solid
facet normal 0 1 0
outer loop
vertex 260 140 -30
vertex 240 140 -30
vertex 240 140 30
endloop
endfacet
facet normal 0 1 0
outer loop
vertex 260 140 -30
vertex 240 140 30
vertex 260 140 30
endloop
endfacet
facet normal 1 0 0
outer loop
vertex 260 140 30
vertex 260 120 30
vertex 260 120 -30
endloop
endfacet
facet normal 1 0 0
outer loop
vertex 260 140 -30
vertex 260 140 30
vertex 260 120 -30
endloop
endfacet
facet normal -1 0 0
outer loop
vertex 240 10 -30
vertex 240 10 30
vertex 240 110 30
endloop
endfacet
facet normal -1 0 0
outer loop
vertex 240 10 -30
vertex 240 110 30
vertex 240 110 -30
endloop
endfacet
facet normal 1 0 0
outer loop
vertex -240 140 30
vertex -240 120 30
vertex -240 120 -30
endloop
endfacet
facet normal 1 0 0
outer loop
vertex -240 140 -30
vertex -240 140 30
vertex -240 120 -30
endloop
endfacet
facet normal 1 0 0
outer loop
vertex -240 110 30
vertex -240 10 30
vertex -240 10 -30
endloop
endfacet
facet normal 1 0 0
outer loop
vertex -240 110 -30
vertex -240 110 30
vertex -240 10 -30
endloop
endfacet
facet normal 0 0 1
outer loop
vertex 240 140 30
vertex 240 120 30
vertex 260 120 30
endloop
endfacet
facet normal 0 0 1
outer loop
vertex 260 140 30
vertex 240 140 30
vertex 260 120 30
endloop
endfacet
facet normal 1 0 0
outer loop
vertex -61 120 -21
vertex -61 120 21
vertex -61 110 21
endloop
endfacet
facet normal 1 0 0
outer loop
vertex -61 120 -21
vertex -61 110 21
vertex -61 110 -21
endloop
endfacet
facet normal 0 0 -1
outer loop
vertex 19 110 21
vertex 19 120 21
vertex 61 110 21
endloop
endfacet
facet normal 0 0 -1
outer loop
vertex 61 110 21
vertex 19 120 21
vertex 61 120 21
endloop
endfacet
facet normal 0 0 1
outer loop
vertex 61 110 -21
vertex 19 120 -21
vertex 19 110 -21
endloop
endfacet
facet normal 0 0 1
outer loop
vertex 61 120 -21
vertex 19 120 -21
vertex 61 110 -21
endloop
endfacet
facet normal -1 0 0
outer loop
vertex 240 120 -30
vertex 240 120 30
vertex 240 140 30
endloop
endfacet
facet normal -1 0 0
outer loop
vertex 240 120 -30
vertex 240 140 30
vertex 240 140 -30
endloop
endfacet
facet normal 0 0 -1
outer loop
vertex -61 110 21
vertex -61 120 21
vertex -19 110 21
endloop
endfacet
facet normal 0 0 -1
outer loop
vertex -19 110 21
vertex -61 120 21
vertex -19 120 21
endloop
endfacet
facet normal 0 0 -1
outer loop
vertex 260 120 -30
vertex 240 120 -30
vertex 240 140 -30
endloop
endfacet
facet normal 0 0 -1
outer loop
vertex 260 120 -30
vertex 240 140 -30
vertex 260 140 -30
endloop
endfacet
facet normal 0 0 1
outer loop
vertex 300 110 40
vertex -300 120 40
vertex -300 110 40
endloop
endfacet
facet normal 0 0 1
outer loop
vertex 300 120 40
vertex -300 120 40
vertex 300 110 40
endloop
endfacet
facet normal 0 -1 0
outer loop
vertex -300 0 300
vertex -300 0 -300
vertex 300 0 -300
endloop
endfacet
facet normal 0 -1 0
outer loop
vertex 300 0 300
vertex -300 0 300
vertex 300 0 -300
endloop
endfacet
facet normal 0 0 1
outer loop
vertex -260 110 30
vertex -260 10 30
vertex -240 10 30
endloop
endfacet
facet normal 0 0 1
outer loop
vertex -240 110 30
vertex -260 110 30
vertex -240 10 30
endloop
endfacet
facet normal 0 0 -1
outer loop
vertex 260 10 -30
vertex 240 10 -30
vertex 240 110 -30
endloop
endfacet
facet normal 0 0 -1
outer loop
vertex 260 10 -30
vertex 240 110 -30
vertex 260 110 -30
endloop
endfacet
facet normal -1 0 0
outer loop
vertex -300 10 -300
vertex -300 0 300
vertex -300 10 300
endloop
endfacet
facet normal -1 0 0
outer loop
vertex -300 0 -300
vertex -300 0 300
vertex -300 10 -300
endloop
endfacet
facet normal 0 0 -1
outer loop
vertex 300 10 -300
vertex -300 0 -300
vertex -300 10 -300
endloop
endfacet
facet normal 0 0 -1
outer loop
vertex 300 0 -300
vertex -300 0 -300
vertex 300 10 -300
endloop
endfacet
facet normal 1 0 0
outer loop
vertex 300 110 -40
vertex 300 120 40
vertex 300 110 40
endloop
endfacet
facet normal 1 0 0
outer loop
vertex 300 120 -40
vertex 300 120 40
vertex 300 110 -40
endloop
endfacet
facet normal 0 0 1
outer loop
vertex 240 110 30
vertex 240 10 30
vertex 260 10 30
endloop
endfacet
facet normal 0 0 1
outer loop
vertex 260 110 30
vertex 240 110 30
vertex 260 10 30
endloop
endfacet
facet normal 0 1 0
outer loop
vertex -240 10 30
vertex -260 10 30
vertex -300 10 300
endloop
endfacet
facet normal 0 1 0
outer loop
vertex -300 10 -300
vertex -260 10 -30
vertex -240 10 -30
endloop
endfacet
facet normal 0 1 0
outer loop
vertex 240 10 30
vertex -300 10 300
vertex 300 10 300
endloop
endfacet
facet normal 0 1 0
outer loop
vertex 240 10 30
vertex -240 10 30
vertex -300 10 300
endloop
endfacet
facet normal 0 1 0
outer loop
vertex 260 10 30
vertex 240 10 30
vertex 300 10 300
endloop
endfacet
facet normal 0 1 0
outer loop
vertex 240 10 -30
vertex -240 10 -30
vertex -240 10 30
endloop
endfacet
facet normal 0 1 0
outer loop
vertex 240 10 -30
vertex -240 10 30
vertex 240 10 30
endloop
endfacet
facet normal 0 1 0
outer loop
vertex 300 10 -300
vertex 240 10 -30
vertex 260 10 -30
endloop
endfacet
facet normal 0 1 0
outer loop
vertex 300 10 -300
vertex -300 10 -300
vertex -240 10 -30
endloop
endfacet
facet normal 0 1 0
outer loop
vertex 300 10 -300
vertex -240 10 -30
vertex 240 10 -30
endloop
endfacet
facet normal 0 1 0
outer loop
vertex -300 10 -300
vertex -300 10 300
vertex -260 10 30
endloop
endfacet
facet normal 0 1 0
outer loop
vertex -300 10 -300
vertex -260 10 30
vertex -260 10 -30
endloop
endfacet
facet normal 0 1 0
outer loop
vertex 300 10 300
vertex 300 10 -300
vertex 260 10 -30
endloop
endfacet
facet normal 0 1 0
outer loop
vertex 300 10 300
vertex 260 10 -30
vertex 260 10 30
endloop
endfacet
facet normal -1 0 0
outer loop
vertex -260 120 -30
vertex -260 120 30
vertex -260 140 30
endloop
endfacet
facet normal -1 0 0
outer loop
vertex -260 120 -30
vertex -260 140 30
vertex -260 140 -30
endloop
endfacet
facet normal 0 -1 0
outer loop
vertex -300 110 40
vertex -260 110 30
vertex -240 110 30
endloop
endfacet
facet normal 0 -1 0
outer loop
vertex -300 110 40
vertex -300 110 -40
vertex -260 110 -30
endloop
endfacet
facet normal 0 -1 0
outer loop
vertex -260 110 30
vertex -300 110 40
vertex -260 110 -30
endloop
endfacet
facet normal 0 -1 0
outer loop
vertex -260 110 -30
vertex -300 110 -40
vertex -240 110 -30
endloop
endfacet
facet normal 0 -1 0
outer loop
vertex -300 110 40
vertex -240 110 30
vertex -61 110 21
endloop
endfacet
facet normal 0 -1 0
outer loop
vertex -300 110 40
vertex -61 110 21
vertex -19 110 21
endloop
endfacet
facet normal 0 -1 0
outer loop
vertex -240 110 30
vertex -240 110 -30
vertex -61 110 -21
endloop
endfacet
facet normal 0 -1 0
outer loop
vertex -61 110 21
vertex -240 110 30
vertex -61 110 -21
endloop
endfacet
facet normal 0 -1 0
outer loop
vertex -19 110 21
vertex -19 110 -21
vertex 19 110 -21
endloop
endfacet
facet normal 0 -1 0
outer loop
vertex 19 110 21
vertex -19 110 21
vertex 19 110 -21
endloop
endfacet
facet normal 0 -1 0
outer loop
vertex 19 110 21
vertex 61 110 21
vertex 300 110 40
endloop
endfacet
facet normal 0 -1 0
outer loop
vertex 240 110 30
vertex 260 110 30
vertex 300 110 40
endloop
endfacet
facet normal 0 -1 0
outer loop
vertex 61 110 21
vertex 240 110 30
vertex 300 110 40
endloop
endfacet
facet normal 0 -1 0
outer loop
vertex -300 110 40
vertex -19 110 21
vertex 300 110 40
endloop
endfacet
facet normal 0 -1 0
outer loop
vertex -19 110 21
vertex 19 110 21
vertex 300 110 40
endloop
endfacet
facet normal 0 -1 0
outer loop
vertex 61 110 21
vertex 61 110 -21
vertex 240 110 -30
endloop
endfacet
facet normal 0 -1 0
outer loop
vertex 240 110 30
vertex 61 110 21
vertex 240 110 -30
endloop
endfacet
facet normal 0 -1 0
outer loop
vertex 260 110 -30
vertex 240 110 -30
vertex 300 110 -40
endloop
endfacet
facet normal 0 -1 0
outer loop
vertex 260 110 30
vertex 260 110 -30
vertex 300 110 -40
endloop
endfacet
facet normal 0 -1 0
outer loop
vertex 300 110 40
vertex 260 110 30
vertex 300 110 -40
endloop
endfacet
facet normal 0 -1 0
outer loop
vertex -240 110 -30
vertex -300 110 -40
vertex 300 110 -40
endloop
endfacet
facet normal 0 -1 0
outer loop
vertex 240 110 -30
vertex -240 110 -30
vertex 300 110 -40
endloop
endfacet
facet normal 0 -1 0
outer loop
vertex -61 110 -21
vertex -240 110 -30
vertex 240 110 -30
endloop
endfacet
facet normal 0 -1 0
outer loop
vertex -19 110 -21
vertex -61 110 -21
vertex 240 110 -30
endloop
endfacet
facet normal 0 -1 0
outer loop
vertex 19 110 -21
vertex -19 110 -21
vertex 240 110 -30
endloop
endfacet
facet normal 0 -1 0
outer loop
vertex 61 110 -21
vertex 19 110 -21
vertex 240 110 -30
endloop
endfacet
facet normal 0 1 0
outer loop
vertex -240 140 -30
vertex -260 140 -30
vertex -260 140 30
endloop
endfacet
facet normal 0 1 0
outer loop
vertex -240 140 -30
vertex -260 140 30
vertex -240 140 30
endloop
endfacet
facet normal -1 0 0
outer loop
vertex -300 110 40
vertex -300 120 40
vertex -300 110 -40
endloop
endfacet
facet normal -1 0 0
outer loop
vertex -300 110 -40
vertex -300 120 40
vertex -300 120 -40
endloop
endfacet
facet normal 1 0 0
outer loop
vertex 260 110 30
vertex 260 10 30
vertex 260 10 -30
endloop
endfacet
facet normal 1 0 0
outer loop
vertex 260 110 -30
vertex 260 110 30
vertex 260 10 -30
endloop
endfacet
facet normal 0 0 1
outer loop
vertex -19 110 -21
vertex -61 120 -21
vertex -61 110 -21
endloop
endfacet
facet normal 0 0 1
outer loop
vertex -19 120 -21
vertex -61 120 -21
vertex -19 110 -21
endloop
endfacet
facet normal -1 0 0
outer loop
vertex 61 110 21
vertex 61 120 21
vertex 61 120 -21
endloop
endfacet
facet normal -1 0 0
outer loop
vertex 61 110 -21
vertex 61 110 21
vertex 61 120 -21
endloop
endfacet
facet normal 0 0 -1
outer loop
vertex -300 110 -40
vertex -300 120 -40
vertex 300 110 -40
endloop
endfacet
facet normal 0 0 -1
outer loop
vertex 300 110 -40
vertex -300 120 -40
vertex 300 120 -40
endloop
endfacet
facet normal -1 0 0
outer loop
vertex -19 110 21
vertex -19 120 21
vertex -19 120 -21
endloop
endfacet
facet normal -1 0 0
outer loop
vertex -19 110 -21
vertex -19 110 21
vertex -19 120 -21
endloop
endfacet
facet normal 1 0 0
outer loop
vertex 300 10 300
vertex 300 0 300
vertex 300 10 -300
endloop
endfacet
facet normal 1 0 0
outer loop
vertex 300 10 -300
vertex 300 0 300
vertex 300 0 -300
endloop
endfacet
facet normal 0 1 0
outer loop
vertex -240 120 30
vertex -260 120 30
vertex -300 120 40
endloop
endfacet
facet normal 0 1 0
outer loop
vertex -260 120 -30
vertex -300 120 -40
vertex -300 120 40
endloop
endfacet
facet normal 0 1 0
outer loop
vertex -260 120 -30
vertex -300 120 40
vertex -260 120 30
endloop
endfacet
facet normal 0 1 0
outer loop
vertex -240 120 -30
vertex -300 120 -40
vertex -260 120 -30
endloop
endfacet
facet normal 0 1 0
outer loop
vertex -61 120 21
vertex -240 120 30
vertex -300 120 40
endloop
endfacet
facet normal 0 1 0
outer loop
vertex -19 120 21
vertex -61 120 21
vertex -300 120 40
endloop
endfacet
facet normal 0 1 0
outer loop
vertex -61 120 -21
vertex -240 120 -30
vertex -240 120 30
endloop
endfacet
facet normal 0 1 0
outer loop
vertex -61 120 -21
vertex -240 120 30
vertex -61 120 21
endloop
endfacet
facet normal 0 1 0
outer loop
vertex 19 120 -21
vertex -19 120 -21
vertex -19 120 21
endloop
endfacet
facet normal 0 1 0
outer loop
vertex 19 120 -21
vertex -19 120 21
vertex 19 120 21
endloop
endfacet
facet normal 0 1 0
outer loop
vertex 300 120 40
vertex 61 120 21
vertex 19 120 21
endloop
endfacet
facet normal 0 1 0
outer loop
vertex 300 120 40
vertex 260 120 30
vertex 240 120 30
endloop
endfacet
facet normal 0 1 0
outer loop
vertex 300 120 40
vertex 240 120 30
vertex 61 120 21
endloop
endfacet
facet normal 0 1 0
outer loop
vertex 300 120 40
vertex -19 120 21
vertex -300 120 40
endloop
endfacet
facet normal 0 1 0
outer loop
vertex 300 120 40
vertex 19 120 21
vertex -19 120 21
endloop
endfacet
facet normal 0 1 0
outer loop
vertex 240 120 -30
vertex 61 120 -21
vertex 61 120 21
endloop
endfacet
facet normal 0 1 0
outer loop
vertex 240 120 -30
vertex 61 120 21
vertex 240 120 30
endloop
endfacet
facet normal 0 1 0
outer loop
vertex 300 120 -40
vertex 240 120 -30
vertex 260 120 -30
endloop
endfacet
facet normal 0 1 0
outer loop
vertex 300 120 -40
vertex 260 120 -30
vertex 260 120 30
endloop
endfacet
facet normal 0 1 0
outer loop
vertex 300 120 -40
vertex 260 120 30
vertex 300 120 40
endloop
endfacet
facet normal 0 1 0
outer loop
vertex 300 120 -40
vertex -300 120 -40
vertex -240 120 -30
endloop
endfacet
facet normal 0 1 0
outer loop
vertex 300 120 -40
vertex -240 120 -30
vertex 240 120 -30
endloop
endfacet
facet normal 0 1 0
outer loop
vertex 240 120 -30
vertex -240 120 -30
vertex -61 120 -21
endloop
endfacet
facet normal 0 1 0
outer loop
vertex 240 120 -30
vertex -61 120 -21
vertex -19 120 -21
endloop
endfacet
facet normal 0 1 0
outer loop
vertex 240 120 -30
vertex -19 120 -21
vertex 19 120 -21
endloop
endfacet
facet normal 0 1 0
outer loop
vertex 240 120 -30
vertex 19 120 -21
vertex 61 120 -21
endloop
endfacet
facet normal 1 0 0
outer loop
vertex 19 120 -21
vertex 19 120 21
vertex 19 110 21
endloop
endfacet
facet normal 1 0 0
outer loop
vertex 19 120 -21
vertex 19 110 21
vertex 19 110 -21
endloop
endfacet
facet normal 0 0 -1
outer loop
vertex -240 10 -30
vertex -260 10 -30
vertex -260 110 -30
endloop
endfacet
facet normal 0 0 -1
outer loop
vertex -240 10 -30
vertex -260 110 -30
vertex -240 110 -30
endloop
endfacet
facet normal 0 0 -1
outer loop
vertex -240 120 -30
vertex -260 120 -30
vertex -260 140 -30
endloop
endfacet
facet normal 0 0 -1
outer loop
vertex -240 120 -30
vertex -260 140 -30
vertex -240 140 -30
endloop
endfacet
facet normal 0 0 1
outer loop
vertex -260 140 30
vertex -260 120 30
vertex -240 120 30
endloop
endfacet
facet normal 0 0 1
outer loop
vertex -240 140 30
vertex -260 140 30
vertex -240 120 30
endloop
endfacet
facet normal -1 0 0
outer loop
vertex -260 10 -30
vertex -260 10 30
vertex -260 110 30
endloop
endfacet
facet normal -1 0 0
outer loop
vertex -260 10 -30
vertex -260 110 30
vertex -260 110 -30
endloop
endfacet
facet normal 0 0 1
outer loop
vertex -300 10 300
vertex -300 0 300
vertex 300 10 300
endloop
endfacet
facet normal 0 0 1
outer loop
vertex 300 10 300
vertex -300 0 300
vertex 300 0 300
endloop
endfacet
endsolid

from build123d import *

# Parameters (mm, degrees)
SKETCH1_W           = 600
SKETCH1_H           = 600
BOSS_EXTRUDE1_DEPTH = 10
SKETCH2_W           = 20
SKETCH2_H           = 60
BOSS_EXTRUDE2_DEPTH = 130
SKETCH3_W           = 600
SKETCH3_H           = 600
SKETCH3_W_2         = 20
SKETCH3_H_2         = 60
BOSS_EXTRUDE3_DEPTH = 10
SKETCH4_OUTSIDE_W   = 774
SKETCH4_OUTSIDE_H   = 774
SKETCH4_OUTSIDE_W_2 = 600
SKETCH4_OUTSIDE_H_2 = 80
CUT_EXTRUDE1_DEPTH  = 10
SKETCH5_W           = 42
SKETCH5_H           = 42
CUT_EXTRUDE2_DEPTH  = 10


with BuildPart() as part:
    # Sketch1 → Boss-Extrude1 (new body)
    with BuildSketch(Plane(origin=(0, 0, 0), x_dir=(1, 0, 0), z_dir=(0, 1, 0))):
        Rectangle(SKETCH1_W, SKETCH1_H)
    extrude(amount=BOSS_EXTRUDE1_DEPTH)

    # Sketch2 → Boss-Extrude2 (add)
    with BuildSketch(Plane(origin=(0, 10, 0), x_dir=(1, 0, 0), z_dir=(0, 1, 0))):
        with Locations((-250, 0)):
            Rectangle(SKETCH2_W, SKETCH2_H)
        with Locations((250, 0)):
            Rectangle(SKETCH2_W, SKETCH2_H)
    extrude(amount=BOSS_EXTRUDE2_DEPTH)

    # Sketch3 → Boss-Extrude3 (add)
    with BuildSketch(Plane(origin=(0, 110, 0), x_dir=(1, 0, 0), z_dir=(0, 1, 0))):
        Rectangle(SKETCH3_W, SKETCH3_H)
        with Locations((-250, 0)):
            Rectangle(SKETCH3_W_2, SKETCH3_H_2, mode=Mode.SUBTRACT)
        with Locations((250, 0)):
            Rectangle(SKETCH3_W_2, SKETCH3_H_2, mode=Mode.SUBTRACT)
    extrude(amount=BOSS_EXTRUDE3_DEPTH)

    # Sketch4 outside → Cut-Extrude1 (cut)
    with BuildSketch(Plane(origin=(0, 120, 0), x_dir=(1, 0, 0), z_dir=(0, 1, 0))):
        Rectangle(SKETCH4_OUTSIDE_W, SKETCH4_OUTSIDE_H)
        Rectangle(SKETCH4_OUTSIDE_W_2, SKETCH4_OUTSIDE_H_2, mode=Mode.SUBTRACT)
    extrude(amount=-CUT_EXTRUDE1_DEPTH, mode=Mode.SUBTRACT)

    # Sketch5 → Cut-Extrude2 (cut)
    with BuildSketch(Plane(origin=(0, 120, 0), x_dir=(1, 0, 0), z_dir=(0, 1, 0))):
        with Locations((-40, 0)):
            Rectangle(SKETCH5_W, SKETCH5_H)
        with Locations((40, 0)):
            Rectangle(SKETCH5_W, SKETCH5_H)
    extrude(amount=-CUT_EXTRUDE2_DEPTH, mode=Mode.SUBTRACT)


solid = part.part
